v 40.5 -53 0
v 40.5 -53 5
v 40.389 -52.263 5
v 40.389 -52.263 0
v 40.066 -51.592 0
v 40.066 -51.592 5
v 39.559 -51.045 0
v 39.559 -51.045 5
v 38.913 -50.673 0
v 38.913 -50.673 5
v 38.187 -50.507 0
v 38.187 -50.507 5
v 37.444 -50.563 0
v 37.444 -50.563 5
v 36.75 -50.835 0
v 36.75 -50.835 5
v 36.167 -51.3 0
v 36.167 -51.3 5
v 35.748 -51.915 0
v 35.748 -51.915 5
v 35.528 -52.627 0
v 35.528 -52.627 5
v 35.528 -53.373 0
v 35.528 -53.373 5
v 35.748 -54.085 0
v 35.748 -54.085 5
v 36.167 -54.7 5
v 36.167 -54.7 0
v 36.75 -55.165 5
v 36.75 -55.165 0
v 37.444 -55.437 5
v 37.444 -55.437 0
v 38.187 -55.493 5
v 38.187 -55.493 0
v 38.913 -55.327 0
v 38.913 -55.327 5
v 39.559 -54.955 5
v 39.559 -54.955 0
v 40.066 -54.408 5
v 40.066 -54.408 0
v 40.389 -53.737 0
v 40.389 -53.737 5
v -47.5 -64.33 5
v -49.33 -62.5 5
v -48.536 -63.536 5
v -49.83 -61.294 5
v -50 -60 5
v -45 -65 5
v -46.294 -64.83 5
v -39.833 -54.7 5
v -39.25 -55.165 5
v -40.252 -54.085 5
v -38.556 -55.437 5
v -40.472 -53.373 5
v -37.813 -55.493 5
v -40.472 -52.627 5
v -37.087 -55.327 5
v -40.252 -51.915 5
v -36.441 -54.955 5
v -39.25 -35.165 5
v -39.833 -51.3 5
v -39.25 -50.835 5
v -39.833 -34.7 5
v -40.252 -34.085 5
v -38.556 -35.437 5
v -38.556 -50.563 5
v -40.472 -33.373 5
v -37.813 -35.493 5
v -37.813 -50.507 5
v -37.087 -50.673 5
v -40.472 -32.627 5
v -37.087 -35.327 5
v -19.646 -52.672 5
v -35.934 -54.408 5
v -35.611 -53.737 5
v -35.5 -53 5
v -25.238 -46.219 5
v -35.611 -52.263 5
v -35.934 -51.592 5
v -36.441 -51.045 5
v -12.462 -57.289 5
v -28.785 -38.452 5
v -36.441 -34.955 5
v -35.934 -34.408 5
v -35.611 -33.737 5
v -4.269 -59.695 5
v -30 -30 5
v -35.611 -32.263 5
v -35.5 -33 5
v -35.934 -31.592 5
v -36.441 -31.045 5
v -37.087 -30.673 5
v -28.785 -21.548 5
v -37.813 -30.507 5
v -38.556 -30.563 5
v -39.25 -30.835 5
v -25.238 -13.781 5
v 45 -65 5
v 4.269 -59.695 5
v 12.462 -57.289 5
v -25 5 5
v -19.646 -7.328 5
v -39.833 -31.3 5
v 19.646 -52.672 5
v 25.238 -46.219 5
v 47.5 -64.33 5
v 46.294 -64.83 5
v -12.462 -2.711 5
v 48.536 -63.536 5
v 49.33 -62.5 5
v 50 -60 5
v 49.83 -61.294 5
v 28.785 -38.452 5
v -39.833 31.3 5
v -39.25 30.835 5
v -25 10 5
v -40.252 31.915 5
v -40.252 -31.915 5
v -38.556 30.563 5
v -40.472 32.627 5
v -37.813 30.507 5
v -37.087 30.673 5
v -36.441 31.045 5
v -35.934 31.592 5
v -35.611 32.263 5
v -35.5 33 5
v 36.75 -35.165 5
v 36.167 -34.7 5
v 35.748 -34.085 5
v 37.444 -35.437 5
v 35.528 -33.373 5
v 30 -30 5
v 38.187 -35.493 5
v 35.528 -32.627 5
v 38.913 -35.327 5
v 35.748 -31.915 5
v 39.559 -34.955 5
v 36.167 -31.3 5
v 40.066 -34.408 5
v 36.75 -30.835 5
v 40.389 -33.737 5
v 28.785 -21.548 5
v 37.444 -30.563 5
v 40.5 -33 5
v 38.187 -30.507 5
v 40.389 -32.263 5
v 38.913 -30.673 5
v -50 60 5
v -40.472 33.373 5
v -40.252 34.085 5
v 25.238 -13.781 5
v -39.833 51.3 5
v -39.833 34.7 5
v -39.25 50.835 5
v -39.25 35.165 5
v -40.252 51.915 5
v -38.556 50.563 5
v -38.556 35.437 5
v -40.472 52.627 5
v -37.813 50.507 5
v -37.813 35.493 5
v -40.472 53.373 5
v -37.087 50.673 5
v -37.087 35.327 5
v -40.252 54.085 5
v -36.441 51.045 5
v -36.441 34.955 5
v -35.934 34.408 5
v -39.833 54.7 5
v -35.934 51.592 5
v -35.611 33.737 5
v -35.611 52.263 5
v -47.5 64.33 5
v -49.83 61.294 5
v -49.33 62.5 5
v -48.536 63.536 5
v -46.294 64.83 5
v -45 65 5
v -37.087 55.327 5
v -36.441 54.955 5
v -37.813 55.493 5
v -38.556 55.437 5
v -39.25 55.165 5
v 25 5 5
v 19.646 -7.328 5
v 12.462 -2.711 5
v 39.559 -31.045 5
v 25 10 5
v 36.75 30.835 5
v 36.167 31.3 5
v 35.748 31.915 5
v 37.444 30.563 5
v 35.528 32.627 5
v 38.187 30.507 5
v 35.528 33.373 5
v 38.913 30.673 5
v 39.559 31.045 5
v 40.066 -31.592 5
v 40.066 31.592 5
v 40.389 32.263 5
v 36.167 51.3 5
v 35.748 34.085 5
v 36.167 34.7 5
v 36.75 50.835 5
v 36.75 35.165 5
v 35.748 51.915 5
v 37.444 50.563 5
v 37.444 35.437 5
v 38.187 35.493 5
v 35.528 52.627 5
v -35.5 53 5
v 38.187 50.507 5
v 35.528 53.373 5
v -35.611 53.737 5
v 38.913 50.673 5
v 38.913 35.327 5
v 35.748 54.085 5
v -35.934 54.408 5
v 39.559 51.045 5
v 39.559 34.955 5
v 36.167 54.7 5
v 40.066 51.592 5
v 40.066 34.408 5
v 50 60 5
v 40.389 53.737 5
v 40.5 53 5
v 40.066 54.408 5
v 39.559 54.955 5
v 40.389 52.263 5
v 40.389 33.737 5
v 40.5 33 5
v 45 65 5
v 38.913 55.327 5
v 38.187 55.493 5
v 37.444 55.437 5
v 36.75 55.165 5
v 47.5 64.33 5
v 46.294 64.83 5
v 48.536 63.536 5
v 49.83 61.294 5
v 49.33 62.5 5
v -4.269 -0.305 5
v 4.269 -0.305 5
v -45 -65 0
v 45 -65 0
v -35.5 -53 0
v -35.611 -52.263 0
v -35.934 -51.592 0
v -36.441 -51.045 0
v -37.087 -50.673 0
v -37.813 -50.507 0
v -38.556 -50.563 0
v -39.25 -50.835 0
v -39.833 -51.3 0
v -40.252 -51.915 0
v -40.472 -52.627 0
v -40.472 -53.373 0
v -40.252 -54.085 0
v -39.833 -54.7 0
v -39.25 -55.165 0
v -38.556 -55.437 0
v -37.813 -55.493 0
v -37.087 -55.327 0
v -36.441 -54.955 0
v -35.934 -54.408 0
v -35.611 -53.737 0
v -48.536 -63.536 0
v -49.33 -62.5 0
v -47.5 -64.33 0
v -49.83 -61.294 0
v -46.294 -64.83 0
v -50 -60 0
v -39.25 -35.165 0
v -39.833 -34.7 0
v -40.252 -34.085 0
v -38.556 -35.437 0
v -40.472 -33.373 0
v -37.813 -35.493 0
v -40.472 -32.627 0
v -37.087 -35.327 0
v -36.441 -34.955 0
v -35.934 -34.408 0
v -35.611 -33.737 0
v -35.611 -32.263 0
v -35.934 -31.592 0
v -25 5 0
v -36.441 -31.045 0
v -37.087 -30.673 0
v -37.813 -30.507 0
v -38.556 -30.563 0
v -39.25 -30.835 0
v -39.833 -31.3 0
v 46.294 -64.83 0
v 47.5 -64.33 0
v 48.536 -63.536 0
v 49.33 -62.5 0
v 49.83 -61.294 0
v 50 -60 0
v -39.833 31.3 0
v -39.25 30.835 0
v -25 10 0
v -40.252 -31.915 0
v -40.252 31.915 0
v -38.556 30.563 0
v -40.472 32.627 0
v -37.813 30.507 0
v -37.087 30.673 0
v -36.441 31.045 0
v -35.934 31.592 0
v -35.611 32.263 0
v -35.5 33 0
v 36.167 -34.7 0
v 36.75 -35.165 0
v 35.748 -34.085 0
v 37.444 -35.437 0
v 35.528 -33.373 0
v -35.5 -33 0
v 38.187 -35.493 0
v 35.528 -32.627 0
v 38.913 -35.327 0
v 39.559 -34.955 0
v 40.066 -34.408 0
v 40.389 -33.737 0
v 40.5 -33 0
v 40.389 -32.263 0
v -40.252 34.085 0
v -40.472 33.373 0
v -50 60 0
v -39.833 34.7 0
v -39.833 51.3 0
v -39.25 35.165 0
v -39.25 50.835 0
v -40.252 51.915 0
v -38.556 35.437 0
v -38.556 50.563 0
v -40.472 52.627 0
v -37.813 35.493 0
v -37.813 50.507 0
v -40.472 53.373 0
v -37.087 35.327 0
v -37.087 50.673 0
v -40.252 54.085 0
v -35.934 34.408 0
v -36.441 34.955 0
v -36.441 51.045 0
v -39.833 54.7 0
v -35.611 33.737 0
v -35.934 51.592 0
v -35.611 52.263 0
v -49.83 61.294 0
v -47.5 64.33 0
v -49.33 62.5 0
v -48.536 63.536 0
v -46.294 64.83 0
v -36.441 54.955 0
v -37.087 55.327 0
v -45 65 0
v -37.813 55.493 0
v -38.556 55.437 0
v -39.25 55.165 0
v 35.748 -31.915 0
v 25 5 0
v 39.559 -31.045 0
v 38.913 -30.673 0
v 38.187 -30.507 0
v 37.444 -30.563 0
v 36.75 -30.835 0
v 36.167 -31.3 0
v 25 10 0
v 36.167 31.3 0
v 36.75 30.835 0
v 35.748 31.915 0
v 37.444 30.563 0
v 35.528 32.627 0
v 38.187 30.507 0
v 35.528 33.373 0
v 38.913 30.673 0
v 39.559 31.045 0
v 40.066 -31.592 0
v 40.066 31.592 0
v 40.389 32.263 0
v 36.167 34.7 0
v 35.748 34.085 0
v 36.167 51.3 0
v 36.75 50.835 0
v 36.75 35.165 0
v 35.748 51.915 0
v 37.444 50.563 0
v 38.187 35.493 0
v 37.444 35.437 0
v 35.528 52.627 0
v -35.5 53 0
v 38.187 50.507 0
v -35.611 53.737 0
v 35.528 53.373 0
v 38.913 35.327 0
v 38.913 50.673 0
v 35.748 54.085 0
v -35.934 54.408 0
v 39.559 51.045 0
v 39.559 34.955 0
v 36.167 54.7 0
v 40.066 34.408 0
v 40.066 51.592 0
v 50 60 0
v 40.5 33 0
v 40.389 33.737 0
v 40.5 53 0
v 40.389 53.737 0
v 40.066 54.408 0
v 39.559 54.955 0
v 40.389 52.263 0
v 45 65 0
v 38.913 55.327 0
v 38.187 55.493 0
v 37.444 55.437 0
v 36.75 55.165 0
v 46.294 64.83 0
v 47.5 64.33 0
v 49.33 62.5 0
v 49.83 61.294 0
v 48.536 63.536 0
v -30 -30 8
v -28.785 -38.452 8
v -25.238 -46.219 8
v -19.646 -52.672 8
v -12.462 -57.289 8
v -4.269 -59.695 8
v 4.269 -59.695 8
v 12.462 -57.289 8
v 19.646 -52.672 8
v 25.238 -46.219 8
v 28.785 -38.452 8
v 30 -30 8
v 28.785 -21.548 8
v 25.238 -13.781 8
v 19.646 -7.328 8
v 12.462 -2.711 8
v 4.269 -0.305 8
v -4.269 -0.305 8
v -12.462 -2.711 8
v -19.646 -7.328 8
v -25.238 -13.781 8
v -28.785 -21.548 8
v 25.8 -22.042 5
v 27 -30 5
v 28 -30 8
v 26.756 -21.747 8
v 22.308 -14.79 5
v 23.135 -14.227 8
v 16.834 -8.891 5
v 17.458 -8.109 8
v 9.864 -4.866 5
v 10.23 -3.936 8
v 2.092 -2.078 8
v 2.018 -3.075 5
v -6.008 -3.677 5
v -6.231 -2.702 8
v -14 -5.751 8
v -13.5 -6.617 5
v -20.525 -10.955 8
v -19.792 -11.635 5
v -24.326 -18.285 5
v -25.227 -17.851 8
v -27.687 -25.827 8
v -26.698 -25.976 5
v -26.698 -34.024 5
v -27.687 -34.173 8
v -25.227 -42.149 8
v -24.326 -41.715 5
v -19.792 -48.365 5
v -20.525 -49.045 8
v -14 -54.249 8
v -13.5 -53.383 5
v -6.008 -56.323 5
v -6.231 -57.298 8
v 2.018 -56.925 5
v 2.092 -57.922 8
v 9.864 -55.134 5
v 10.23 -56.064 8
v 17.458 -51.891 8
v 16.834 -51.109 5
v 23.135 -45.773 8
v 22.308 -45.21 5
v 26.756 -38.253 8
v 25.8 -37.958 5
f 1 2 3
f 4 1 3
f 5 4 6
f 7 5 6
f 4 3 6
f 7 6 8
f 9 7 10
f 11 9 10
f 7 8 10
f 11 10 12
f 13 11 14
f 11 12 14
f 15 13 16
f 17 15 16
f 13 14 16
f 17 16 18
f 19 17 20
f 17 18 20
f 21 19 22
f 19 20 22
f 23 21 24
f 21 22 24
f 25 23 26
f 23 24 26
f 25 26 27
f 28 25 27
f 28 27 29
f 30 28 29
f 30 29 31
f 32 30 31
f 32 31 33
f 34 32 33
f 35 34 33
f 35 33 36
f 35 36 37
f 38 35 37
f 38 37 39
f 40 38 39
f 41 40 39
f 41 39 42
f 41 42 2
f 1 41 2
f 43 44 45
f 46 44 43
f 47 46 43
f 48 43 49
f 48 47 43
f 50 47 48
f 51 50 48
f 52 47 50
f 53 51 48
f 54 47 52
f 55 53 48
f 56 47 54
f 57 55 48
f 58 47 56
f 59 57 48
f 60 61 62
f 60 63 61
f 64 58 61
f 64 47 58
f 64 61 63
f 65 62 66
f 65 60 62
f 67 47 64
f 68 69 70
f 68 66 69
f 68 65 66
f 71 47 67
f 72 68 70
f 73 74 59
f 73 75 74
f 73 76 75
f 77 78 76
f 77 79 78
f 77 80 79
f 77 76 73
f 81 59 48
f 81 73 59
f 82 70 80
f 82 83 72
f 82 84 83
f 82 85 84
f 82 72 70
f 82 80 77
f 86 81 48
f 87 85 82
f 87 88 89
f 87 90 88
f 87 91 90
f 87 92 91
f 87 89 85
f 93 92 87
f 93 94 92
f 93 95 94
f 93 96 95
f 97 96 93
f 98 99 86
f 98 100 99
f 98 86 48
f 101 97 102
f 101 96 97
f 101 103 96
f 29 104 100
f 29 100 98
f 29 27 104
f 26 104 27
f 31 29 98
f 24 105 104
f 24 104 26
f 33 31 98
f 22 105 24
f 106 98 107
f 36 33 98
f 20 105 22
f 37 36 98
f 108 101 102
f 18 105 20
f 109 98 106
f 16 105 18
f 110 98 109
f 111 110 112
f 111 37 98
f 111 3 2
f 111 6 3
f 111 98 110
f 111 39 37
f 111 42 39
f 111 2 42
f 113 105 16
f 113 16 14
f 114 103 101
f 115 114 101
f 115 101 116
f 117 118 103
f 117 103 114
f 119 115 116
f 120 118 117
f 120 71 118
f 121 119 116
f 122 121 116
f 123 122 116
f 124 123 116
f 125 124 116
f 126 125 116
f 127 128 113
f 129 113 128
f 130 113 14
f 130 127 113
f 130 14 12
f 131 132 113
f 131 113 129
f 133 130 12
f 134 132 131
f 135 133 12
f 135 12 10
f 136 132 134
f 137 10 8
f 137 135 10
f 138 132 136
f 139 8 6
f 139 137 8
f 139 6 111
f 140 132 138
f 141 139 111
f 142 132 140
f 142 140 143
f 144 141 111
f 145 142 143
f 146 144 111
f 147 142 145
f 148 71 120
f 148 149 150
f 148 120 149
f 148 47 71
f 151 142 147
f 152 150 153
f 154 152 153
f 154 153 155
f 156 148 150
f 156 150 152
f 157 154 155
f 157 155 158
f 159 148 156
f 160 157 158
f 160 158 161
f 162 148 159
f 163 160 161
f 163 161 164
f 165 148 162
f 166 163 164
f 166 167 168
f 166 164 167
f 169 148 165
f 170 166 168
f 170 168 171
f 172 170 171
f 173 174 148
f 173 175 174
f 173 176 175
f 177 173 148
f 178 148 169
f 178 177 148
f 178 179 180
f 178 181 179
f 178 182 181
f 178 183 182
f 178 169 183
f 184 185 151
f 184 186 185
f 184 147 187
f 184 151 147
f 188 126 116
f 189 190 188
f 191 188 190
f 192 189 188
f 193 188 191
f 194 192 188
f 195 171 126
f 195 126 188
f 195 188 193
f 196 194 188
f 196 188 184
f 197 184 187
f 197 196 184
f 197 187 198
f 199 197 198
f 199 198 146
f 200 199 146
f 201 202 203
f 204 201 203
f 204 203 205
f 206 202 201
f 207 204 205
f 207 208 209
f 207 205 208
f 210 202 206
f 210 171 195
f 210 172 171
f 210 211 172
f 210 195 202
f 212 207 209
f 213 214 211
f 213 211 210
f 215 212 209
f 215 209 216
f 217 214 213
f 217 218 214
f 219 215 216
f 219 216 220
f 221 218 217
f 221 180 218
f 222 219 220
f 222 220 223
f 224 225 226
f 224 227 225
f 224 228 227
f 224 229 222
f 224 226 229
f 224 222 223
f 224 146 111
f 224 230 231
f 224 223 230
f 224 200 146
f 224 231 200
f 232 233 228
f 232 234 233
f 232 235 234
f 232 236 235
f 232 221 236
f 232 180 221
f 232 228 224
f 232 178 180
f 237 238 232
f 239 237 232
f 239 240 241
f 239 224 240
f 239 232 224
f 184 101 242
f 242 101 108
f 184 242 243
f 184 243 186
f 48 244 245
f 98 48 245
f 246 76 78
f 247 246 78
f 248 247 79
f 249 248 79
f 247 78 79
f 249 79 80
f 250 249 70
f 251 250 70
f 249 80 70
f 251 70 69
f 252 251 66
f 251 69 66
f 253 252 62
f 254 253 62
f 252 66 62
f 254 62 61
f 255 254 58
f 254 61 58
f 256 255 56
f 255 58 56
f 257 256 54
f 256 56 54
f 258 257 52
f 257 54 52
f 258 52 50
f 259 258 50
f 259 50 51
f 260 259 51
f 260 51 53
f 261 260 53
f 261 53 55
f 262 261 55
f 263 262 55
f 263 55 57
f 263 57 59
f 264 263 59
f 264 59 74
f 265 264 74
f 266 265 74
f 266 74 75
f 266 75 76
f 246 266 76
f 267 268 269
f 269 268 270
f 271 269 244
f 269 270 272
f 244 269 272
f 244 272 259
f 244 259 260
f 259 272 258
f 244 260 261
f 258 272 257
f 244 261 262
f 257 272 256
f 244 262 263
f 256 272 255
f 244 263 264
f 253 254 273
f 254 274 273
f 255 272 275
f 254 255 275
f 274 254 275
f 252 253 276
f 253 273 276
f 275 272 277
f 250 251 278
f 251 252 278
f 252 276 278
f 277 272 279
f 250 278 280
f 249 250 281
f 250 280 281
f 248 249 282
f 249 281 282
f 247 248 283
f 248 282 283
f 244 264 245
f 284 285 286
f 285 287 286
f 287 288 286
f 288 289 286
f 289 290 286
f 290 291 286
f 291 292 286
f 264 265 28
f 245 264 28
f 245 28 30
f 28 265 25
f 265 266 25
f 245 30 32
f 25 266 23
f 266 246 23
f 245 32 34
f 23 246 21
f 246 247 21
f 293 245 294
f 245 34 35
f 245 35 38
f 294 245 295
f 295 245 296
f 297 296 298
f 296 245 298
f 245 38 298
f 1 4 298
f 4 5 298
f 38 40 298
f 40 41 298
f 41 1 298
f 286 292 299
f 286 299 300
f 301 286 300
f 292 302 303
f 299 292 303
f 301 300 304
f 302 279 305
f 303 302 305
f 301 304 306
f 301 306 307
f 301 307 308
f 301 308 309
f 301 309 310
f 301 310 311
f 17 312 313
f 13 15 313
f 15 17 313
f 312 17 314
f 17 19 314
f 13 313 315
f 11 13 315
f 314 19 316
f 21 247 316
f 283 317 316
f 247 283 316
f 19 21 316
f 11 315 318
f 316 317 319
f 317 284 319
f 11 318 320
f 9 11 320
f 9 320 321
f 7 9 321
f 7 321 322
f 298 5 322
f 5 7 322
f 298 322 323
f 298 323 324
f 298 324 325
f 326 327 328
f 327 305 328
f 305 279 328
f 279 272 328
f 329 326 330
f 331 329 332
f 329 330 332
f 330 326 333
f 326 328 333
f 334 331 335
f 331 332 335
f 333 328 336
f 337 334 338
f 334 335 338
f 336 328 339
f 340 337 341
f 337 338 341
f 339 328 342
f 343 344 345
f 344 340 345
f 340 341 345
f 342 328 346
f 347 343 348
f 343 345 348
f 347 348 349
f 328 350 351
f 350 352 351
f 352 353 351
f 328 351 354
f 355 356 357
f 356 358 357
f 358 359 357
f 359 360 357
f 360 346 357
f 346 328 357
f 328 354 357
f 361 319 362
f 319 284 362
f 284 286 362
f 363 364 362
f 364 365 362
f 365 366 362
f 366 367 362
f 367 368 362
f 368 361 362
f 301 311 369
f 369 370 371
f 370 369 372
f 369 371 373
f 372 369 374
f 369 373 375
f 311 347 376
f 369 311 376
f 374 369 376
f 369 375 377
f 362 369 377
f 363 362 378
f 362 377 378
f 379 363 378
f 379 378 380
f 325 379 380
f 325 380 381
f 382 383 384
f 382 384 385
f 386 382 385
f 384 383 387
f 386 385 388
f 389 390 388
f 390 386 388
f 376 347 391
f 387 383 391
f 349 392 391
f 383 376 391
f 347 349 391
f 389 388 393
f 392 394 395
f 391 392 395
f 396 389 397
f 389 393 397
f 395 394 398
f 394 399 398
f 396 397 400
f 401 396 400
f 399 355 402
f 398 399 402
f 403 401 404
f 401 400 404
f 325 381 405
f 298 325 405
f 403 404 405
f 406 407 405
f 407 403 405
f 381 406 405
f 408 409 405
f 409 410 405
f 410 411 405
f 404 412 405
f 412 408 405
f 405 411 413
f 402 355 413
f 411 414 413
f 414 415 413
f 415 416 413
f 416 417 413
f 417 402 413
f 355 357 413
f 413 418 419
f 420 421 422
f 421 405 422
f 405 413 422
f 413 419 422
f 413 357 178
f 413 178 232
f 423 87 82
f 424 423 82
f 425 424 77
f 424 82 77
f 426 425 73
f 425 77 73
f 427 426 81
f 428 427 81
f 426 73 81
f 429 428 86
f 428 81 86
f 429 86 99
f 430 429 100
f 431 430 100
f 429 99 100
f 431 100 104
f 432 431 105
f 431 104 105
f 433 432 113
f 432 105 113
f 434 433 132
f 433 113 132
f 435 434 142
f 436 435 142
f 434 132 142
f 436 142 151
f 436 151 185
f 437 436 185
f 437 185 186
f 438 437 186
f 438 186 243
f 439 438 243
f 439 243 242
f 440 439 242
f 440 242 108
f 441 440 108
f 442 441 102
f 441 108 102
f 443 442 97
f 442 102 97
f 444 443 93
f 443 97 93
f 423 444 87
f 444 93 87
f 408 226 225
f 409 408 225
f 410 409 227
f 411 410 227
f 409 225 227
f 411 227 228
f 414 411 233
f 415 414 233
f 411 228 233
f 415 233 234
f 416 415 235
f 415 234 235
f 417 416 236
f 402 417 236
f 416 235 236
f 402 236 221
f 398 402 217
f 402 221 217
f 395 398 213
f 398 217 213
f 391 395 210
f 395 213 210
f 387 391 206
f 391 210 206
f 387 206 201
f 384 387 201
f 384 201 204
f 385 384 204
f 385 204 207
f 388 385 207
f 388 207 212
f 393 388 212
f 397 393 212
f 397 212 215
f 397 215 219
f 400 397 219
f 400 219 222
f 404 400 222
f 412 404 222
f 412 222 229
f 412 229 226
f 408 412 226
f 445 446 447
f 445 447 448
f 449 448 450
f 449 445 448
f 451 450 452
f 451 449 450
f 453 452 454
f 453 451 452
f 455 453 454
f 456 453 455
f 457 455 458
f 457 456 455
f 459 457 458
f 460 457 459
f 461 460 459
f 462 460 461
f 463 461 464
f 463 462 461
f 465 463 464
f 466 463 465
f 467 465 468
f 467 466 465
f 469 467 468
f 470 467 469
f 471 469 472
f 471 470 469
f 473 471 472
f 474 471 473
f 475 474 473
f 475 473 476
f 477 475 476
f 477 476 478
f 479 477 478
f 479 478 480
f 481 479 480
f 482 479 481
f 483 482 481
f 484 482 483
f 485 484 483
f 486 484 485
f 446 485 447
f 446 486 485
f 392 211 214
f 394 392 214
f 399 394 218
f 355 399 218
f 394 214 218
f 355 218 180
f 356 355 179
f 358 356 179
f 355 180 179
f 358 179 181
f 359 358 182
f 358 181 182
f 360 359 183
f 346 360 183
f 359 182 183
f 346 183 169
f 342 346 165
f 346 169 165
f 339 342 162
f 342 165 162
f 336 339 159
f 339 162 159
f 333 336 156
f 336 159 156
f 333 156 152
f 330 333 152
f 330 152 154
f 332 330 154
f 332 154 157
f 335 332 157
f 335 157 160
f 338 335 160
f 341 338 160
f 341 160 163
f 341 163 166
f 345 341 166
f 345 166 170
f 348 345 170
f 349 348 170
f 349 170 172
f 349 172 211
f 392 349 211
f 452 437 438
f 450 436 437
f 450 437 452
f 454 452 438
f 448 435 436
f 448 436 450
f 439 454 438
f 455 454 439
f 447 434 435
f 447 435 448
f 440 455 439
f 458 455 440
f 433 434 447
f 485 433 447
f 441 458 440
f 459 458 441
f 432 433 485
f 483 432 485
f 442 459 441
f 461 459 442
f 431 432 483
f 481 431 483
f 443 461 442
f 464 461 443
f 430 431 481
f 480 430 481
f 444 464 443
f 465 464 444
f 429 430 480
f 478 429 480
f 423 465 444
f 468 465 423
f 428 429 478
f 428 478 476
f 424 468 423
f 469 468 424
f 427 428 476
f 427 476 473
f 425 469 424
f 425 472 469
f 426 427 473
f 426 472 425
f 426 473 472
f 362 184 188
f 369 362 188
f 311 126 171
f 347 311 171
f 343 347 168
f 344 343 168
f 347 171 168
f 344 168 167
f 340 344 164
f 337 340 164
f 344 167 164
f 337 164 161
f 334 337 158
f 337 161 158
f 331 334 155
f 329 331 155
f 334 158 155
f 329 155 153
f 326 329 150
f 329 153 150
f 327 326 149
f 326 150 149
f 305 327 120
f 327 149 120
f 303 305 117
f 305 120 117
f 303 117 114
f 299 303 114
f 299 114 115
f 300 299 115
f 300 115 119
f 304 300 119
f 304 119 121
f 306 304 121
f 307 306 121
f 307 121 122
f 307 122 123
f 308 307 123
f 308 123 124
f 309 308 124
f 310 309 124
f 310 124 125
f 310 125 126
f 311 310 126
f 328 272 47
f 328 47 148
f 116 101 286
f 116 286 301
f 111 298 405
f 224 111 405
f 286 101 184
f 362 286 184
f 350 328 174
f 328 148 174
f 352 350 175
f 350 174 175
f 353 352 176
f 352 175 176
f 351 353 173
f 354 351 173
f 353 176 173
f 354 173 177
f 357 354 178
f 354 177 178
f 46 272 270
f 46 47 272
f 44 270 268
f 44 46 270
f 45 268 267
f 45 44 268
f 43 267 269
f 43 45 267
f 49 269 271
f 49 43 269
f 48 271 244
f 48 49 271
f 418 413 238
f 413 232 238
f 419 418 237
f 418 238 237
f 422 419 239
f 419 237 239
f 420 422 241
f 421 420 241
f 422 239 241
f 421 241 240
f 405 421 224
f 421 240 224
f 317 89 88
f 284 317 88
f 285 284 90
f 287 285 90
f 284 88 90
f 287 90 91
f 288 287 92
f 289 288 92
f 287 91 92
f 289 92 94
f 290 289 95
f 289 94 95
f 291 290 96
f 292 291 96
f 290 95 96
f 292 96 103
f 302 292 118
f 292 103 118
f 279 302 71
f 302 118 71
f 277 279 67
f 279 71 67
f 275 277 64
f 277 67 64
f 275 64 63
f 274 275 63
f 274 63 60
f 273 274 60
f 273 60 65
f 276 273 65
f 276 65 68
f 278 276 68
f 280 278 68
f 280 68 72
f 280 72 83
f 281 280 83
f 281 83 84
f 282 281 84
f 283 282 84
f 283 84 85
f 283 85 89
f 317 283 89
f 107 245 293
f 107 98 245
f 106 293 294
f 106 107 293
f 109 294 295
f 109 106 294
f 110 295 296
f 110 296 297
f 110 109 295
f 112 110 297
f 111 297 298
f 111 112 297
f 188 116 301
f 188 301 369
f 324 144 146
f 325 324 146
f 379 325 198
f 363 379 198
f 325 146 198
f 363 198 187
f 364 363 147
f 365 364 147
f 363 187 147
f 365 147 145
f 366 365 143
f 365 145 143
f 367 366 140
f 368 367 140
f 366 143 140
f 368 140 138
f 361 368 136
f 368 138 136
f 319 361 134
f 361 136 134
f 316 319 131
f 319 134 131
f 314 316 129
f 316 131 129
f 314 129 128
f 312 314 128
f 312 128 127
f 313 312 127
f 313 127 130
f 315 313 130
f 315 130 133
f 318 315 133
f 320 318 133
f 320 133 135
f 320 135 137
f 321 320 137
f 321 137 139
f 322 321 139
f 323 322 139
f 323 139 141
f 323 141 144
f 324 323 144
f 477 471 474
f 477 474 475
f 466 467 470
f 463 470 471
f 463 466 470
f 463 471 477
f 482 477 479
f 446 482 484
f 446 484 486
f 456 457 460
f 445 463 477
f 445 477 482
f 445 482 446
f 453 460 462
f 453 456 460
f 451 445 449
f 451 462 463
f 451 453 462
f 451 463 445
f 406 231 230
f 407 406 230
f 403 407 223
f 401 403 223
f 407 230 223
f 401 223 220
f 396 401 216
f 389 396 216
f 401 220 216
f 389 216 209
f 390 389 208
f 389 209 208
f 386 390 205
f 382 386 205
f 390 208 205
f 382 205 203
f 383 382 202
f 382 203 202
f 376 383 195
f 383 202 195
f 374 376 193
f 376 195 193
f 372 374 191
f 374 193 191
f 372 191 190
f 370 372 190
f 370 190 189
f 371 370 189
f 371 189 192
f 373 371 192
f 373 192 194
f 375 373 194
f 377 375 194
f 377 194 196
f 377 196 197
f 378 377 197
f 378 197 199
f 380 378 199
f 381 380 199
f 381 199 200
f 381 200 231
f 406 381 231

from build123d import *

# Parameters (mm, degrees)
SKIZZE1_W                       = 100
SKIZZE1_H                       = 130
AUFSATZ_LINEAR_AUSTRAGEN1_DEPTH = 5
SKIZZE2_R                       = 30
SKIZZE2_R_2                     = 27
AUFSATZ_LINEAR_AUSTRAGEN2_DEPTH = 3
SKIZZE4_R                       = 2.5
SKIZZE4_W                       = 50
SKIZZE4_H                       = 5
SCHNITT_LINEAR_AUSTRAGEN1_DEPTH = 83.158383626
FASE1_SIZE2                     = 3
FASE1_SIZE                      = 1
VERRUNDUNG1_R                   = 5


with BuildPart() as part:
    # Skizze1 → Aufsatz-Linear austragen1 (new body)
    with BuildSketch(Plane.XY):
        Rectangle(SKIZZE1_W, SKIZZE1_H)
    extrude(amount=AUFSATZ_LINEAR_AUSTRAGEN1_DEPTH)

    # Skizze2 → Aufsatz-Linear austragen2 (add)
    with BuildSketch(Plane.XY.offset(5)):
        with Locations(Location((0, -30, 0), (0, 0, 180))):
            Circle(SKIZZE2_R)
        with Locations((0, -30)):
            Circle(SKIZZE2_R_2, mode=Mode.SUBTRACT)
    extrude(amount=AUFSATZ_LINEAR_AUSTRAGEN2_DEPTH)

    # Skizze4 → Schnitt-Linear austragen1 (cut, through all)
    with BuildSketch(Plane.XY.offset(5)):
        with Locations((-38, -53)):
            Circle(SKIZZE4_R)
        with Locations((38, -53)):
            Circle(SKIZZE4_R)
        with Locations((38, 53)):
            Circle(SKIZZE4_R)
        with Locations((-38, 53)):
            Circle(SKIZZE4_R)
        with Locations((-38, -33)):
            Circle(SKIZZE4_R)
        with Locations((38, -33)):
            Circle(SKIZZE4_R)
        with Locations((38, 33)):
            Circle(SKIZZE4_R)
        with Locations((-38, 33)):
            Circle(SKIZZE4_R)
        with Locations((0, 7.5)):
            Rectangle(SKIZZE4_W, SKIZZE4_H)
    extrude(amount=-SCHNITT_LINEAR_AUSTRAGEN1_DEPTH, mode=Mode.SUBTRACT)

    # Fase1
    fase1_edges = [part.edges().sort_by_distance(p)[0] for p in [
        (-27, -30, 8),
    ]]
    fase1_side = [part.faces().sort_by_distance(p)[0] for p in [
        (-27.02, -30, 8),
    ]]
    chamfer(fase1_edges, length=FASE1_SIZE - 0.0001, length2=FASE1_SIZE2 - 0.0001, reference=fase1_side[0])  # a hair under: the kernel refuses the full size

    # Verrundung1
    verrundung1_edges = [part.edges().sort_by_distance(p)[0] for p in [
        (50, -65, 2.5),
        (-50, -65, 2.5),
        (-50, 65, 2.5),
        (50, 65, 2.5),
    ]]
    fillet(verrundung1_edges, radius=VERRUNDUNG1_R)


solid = part.part
